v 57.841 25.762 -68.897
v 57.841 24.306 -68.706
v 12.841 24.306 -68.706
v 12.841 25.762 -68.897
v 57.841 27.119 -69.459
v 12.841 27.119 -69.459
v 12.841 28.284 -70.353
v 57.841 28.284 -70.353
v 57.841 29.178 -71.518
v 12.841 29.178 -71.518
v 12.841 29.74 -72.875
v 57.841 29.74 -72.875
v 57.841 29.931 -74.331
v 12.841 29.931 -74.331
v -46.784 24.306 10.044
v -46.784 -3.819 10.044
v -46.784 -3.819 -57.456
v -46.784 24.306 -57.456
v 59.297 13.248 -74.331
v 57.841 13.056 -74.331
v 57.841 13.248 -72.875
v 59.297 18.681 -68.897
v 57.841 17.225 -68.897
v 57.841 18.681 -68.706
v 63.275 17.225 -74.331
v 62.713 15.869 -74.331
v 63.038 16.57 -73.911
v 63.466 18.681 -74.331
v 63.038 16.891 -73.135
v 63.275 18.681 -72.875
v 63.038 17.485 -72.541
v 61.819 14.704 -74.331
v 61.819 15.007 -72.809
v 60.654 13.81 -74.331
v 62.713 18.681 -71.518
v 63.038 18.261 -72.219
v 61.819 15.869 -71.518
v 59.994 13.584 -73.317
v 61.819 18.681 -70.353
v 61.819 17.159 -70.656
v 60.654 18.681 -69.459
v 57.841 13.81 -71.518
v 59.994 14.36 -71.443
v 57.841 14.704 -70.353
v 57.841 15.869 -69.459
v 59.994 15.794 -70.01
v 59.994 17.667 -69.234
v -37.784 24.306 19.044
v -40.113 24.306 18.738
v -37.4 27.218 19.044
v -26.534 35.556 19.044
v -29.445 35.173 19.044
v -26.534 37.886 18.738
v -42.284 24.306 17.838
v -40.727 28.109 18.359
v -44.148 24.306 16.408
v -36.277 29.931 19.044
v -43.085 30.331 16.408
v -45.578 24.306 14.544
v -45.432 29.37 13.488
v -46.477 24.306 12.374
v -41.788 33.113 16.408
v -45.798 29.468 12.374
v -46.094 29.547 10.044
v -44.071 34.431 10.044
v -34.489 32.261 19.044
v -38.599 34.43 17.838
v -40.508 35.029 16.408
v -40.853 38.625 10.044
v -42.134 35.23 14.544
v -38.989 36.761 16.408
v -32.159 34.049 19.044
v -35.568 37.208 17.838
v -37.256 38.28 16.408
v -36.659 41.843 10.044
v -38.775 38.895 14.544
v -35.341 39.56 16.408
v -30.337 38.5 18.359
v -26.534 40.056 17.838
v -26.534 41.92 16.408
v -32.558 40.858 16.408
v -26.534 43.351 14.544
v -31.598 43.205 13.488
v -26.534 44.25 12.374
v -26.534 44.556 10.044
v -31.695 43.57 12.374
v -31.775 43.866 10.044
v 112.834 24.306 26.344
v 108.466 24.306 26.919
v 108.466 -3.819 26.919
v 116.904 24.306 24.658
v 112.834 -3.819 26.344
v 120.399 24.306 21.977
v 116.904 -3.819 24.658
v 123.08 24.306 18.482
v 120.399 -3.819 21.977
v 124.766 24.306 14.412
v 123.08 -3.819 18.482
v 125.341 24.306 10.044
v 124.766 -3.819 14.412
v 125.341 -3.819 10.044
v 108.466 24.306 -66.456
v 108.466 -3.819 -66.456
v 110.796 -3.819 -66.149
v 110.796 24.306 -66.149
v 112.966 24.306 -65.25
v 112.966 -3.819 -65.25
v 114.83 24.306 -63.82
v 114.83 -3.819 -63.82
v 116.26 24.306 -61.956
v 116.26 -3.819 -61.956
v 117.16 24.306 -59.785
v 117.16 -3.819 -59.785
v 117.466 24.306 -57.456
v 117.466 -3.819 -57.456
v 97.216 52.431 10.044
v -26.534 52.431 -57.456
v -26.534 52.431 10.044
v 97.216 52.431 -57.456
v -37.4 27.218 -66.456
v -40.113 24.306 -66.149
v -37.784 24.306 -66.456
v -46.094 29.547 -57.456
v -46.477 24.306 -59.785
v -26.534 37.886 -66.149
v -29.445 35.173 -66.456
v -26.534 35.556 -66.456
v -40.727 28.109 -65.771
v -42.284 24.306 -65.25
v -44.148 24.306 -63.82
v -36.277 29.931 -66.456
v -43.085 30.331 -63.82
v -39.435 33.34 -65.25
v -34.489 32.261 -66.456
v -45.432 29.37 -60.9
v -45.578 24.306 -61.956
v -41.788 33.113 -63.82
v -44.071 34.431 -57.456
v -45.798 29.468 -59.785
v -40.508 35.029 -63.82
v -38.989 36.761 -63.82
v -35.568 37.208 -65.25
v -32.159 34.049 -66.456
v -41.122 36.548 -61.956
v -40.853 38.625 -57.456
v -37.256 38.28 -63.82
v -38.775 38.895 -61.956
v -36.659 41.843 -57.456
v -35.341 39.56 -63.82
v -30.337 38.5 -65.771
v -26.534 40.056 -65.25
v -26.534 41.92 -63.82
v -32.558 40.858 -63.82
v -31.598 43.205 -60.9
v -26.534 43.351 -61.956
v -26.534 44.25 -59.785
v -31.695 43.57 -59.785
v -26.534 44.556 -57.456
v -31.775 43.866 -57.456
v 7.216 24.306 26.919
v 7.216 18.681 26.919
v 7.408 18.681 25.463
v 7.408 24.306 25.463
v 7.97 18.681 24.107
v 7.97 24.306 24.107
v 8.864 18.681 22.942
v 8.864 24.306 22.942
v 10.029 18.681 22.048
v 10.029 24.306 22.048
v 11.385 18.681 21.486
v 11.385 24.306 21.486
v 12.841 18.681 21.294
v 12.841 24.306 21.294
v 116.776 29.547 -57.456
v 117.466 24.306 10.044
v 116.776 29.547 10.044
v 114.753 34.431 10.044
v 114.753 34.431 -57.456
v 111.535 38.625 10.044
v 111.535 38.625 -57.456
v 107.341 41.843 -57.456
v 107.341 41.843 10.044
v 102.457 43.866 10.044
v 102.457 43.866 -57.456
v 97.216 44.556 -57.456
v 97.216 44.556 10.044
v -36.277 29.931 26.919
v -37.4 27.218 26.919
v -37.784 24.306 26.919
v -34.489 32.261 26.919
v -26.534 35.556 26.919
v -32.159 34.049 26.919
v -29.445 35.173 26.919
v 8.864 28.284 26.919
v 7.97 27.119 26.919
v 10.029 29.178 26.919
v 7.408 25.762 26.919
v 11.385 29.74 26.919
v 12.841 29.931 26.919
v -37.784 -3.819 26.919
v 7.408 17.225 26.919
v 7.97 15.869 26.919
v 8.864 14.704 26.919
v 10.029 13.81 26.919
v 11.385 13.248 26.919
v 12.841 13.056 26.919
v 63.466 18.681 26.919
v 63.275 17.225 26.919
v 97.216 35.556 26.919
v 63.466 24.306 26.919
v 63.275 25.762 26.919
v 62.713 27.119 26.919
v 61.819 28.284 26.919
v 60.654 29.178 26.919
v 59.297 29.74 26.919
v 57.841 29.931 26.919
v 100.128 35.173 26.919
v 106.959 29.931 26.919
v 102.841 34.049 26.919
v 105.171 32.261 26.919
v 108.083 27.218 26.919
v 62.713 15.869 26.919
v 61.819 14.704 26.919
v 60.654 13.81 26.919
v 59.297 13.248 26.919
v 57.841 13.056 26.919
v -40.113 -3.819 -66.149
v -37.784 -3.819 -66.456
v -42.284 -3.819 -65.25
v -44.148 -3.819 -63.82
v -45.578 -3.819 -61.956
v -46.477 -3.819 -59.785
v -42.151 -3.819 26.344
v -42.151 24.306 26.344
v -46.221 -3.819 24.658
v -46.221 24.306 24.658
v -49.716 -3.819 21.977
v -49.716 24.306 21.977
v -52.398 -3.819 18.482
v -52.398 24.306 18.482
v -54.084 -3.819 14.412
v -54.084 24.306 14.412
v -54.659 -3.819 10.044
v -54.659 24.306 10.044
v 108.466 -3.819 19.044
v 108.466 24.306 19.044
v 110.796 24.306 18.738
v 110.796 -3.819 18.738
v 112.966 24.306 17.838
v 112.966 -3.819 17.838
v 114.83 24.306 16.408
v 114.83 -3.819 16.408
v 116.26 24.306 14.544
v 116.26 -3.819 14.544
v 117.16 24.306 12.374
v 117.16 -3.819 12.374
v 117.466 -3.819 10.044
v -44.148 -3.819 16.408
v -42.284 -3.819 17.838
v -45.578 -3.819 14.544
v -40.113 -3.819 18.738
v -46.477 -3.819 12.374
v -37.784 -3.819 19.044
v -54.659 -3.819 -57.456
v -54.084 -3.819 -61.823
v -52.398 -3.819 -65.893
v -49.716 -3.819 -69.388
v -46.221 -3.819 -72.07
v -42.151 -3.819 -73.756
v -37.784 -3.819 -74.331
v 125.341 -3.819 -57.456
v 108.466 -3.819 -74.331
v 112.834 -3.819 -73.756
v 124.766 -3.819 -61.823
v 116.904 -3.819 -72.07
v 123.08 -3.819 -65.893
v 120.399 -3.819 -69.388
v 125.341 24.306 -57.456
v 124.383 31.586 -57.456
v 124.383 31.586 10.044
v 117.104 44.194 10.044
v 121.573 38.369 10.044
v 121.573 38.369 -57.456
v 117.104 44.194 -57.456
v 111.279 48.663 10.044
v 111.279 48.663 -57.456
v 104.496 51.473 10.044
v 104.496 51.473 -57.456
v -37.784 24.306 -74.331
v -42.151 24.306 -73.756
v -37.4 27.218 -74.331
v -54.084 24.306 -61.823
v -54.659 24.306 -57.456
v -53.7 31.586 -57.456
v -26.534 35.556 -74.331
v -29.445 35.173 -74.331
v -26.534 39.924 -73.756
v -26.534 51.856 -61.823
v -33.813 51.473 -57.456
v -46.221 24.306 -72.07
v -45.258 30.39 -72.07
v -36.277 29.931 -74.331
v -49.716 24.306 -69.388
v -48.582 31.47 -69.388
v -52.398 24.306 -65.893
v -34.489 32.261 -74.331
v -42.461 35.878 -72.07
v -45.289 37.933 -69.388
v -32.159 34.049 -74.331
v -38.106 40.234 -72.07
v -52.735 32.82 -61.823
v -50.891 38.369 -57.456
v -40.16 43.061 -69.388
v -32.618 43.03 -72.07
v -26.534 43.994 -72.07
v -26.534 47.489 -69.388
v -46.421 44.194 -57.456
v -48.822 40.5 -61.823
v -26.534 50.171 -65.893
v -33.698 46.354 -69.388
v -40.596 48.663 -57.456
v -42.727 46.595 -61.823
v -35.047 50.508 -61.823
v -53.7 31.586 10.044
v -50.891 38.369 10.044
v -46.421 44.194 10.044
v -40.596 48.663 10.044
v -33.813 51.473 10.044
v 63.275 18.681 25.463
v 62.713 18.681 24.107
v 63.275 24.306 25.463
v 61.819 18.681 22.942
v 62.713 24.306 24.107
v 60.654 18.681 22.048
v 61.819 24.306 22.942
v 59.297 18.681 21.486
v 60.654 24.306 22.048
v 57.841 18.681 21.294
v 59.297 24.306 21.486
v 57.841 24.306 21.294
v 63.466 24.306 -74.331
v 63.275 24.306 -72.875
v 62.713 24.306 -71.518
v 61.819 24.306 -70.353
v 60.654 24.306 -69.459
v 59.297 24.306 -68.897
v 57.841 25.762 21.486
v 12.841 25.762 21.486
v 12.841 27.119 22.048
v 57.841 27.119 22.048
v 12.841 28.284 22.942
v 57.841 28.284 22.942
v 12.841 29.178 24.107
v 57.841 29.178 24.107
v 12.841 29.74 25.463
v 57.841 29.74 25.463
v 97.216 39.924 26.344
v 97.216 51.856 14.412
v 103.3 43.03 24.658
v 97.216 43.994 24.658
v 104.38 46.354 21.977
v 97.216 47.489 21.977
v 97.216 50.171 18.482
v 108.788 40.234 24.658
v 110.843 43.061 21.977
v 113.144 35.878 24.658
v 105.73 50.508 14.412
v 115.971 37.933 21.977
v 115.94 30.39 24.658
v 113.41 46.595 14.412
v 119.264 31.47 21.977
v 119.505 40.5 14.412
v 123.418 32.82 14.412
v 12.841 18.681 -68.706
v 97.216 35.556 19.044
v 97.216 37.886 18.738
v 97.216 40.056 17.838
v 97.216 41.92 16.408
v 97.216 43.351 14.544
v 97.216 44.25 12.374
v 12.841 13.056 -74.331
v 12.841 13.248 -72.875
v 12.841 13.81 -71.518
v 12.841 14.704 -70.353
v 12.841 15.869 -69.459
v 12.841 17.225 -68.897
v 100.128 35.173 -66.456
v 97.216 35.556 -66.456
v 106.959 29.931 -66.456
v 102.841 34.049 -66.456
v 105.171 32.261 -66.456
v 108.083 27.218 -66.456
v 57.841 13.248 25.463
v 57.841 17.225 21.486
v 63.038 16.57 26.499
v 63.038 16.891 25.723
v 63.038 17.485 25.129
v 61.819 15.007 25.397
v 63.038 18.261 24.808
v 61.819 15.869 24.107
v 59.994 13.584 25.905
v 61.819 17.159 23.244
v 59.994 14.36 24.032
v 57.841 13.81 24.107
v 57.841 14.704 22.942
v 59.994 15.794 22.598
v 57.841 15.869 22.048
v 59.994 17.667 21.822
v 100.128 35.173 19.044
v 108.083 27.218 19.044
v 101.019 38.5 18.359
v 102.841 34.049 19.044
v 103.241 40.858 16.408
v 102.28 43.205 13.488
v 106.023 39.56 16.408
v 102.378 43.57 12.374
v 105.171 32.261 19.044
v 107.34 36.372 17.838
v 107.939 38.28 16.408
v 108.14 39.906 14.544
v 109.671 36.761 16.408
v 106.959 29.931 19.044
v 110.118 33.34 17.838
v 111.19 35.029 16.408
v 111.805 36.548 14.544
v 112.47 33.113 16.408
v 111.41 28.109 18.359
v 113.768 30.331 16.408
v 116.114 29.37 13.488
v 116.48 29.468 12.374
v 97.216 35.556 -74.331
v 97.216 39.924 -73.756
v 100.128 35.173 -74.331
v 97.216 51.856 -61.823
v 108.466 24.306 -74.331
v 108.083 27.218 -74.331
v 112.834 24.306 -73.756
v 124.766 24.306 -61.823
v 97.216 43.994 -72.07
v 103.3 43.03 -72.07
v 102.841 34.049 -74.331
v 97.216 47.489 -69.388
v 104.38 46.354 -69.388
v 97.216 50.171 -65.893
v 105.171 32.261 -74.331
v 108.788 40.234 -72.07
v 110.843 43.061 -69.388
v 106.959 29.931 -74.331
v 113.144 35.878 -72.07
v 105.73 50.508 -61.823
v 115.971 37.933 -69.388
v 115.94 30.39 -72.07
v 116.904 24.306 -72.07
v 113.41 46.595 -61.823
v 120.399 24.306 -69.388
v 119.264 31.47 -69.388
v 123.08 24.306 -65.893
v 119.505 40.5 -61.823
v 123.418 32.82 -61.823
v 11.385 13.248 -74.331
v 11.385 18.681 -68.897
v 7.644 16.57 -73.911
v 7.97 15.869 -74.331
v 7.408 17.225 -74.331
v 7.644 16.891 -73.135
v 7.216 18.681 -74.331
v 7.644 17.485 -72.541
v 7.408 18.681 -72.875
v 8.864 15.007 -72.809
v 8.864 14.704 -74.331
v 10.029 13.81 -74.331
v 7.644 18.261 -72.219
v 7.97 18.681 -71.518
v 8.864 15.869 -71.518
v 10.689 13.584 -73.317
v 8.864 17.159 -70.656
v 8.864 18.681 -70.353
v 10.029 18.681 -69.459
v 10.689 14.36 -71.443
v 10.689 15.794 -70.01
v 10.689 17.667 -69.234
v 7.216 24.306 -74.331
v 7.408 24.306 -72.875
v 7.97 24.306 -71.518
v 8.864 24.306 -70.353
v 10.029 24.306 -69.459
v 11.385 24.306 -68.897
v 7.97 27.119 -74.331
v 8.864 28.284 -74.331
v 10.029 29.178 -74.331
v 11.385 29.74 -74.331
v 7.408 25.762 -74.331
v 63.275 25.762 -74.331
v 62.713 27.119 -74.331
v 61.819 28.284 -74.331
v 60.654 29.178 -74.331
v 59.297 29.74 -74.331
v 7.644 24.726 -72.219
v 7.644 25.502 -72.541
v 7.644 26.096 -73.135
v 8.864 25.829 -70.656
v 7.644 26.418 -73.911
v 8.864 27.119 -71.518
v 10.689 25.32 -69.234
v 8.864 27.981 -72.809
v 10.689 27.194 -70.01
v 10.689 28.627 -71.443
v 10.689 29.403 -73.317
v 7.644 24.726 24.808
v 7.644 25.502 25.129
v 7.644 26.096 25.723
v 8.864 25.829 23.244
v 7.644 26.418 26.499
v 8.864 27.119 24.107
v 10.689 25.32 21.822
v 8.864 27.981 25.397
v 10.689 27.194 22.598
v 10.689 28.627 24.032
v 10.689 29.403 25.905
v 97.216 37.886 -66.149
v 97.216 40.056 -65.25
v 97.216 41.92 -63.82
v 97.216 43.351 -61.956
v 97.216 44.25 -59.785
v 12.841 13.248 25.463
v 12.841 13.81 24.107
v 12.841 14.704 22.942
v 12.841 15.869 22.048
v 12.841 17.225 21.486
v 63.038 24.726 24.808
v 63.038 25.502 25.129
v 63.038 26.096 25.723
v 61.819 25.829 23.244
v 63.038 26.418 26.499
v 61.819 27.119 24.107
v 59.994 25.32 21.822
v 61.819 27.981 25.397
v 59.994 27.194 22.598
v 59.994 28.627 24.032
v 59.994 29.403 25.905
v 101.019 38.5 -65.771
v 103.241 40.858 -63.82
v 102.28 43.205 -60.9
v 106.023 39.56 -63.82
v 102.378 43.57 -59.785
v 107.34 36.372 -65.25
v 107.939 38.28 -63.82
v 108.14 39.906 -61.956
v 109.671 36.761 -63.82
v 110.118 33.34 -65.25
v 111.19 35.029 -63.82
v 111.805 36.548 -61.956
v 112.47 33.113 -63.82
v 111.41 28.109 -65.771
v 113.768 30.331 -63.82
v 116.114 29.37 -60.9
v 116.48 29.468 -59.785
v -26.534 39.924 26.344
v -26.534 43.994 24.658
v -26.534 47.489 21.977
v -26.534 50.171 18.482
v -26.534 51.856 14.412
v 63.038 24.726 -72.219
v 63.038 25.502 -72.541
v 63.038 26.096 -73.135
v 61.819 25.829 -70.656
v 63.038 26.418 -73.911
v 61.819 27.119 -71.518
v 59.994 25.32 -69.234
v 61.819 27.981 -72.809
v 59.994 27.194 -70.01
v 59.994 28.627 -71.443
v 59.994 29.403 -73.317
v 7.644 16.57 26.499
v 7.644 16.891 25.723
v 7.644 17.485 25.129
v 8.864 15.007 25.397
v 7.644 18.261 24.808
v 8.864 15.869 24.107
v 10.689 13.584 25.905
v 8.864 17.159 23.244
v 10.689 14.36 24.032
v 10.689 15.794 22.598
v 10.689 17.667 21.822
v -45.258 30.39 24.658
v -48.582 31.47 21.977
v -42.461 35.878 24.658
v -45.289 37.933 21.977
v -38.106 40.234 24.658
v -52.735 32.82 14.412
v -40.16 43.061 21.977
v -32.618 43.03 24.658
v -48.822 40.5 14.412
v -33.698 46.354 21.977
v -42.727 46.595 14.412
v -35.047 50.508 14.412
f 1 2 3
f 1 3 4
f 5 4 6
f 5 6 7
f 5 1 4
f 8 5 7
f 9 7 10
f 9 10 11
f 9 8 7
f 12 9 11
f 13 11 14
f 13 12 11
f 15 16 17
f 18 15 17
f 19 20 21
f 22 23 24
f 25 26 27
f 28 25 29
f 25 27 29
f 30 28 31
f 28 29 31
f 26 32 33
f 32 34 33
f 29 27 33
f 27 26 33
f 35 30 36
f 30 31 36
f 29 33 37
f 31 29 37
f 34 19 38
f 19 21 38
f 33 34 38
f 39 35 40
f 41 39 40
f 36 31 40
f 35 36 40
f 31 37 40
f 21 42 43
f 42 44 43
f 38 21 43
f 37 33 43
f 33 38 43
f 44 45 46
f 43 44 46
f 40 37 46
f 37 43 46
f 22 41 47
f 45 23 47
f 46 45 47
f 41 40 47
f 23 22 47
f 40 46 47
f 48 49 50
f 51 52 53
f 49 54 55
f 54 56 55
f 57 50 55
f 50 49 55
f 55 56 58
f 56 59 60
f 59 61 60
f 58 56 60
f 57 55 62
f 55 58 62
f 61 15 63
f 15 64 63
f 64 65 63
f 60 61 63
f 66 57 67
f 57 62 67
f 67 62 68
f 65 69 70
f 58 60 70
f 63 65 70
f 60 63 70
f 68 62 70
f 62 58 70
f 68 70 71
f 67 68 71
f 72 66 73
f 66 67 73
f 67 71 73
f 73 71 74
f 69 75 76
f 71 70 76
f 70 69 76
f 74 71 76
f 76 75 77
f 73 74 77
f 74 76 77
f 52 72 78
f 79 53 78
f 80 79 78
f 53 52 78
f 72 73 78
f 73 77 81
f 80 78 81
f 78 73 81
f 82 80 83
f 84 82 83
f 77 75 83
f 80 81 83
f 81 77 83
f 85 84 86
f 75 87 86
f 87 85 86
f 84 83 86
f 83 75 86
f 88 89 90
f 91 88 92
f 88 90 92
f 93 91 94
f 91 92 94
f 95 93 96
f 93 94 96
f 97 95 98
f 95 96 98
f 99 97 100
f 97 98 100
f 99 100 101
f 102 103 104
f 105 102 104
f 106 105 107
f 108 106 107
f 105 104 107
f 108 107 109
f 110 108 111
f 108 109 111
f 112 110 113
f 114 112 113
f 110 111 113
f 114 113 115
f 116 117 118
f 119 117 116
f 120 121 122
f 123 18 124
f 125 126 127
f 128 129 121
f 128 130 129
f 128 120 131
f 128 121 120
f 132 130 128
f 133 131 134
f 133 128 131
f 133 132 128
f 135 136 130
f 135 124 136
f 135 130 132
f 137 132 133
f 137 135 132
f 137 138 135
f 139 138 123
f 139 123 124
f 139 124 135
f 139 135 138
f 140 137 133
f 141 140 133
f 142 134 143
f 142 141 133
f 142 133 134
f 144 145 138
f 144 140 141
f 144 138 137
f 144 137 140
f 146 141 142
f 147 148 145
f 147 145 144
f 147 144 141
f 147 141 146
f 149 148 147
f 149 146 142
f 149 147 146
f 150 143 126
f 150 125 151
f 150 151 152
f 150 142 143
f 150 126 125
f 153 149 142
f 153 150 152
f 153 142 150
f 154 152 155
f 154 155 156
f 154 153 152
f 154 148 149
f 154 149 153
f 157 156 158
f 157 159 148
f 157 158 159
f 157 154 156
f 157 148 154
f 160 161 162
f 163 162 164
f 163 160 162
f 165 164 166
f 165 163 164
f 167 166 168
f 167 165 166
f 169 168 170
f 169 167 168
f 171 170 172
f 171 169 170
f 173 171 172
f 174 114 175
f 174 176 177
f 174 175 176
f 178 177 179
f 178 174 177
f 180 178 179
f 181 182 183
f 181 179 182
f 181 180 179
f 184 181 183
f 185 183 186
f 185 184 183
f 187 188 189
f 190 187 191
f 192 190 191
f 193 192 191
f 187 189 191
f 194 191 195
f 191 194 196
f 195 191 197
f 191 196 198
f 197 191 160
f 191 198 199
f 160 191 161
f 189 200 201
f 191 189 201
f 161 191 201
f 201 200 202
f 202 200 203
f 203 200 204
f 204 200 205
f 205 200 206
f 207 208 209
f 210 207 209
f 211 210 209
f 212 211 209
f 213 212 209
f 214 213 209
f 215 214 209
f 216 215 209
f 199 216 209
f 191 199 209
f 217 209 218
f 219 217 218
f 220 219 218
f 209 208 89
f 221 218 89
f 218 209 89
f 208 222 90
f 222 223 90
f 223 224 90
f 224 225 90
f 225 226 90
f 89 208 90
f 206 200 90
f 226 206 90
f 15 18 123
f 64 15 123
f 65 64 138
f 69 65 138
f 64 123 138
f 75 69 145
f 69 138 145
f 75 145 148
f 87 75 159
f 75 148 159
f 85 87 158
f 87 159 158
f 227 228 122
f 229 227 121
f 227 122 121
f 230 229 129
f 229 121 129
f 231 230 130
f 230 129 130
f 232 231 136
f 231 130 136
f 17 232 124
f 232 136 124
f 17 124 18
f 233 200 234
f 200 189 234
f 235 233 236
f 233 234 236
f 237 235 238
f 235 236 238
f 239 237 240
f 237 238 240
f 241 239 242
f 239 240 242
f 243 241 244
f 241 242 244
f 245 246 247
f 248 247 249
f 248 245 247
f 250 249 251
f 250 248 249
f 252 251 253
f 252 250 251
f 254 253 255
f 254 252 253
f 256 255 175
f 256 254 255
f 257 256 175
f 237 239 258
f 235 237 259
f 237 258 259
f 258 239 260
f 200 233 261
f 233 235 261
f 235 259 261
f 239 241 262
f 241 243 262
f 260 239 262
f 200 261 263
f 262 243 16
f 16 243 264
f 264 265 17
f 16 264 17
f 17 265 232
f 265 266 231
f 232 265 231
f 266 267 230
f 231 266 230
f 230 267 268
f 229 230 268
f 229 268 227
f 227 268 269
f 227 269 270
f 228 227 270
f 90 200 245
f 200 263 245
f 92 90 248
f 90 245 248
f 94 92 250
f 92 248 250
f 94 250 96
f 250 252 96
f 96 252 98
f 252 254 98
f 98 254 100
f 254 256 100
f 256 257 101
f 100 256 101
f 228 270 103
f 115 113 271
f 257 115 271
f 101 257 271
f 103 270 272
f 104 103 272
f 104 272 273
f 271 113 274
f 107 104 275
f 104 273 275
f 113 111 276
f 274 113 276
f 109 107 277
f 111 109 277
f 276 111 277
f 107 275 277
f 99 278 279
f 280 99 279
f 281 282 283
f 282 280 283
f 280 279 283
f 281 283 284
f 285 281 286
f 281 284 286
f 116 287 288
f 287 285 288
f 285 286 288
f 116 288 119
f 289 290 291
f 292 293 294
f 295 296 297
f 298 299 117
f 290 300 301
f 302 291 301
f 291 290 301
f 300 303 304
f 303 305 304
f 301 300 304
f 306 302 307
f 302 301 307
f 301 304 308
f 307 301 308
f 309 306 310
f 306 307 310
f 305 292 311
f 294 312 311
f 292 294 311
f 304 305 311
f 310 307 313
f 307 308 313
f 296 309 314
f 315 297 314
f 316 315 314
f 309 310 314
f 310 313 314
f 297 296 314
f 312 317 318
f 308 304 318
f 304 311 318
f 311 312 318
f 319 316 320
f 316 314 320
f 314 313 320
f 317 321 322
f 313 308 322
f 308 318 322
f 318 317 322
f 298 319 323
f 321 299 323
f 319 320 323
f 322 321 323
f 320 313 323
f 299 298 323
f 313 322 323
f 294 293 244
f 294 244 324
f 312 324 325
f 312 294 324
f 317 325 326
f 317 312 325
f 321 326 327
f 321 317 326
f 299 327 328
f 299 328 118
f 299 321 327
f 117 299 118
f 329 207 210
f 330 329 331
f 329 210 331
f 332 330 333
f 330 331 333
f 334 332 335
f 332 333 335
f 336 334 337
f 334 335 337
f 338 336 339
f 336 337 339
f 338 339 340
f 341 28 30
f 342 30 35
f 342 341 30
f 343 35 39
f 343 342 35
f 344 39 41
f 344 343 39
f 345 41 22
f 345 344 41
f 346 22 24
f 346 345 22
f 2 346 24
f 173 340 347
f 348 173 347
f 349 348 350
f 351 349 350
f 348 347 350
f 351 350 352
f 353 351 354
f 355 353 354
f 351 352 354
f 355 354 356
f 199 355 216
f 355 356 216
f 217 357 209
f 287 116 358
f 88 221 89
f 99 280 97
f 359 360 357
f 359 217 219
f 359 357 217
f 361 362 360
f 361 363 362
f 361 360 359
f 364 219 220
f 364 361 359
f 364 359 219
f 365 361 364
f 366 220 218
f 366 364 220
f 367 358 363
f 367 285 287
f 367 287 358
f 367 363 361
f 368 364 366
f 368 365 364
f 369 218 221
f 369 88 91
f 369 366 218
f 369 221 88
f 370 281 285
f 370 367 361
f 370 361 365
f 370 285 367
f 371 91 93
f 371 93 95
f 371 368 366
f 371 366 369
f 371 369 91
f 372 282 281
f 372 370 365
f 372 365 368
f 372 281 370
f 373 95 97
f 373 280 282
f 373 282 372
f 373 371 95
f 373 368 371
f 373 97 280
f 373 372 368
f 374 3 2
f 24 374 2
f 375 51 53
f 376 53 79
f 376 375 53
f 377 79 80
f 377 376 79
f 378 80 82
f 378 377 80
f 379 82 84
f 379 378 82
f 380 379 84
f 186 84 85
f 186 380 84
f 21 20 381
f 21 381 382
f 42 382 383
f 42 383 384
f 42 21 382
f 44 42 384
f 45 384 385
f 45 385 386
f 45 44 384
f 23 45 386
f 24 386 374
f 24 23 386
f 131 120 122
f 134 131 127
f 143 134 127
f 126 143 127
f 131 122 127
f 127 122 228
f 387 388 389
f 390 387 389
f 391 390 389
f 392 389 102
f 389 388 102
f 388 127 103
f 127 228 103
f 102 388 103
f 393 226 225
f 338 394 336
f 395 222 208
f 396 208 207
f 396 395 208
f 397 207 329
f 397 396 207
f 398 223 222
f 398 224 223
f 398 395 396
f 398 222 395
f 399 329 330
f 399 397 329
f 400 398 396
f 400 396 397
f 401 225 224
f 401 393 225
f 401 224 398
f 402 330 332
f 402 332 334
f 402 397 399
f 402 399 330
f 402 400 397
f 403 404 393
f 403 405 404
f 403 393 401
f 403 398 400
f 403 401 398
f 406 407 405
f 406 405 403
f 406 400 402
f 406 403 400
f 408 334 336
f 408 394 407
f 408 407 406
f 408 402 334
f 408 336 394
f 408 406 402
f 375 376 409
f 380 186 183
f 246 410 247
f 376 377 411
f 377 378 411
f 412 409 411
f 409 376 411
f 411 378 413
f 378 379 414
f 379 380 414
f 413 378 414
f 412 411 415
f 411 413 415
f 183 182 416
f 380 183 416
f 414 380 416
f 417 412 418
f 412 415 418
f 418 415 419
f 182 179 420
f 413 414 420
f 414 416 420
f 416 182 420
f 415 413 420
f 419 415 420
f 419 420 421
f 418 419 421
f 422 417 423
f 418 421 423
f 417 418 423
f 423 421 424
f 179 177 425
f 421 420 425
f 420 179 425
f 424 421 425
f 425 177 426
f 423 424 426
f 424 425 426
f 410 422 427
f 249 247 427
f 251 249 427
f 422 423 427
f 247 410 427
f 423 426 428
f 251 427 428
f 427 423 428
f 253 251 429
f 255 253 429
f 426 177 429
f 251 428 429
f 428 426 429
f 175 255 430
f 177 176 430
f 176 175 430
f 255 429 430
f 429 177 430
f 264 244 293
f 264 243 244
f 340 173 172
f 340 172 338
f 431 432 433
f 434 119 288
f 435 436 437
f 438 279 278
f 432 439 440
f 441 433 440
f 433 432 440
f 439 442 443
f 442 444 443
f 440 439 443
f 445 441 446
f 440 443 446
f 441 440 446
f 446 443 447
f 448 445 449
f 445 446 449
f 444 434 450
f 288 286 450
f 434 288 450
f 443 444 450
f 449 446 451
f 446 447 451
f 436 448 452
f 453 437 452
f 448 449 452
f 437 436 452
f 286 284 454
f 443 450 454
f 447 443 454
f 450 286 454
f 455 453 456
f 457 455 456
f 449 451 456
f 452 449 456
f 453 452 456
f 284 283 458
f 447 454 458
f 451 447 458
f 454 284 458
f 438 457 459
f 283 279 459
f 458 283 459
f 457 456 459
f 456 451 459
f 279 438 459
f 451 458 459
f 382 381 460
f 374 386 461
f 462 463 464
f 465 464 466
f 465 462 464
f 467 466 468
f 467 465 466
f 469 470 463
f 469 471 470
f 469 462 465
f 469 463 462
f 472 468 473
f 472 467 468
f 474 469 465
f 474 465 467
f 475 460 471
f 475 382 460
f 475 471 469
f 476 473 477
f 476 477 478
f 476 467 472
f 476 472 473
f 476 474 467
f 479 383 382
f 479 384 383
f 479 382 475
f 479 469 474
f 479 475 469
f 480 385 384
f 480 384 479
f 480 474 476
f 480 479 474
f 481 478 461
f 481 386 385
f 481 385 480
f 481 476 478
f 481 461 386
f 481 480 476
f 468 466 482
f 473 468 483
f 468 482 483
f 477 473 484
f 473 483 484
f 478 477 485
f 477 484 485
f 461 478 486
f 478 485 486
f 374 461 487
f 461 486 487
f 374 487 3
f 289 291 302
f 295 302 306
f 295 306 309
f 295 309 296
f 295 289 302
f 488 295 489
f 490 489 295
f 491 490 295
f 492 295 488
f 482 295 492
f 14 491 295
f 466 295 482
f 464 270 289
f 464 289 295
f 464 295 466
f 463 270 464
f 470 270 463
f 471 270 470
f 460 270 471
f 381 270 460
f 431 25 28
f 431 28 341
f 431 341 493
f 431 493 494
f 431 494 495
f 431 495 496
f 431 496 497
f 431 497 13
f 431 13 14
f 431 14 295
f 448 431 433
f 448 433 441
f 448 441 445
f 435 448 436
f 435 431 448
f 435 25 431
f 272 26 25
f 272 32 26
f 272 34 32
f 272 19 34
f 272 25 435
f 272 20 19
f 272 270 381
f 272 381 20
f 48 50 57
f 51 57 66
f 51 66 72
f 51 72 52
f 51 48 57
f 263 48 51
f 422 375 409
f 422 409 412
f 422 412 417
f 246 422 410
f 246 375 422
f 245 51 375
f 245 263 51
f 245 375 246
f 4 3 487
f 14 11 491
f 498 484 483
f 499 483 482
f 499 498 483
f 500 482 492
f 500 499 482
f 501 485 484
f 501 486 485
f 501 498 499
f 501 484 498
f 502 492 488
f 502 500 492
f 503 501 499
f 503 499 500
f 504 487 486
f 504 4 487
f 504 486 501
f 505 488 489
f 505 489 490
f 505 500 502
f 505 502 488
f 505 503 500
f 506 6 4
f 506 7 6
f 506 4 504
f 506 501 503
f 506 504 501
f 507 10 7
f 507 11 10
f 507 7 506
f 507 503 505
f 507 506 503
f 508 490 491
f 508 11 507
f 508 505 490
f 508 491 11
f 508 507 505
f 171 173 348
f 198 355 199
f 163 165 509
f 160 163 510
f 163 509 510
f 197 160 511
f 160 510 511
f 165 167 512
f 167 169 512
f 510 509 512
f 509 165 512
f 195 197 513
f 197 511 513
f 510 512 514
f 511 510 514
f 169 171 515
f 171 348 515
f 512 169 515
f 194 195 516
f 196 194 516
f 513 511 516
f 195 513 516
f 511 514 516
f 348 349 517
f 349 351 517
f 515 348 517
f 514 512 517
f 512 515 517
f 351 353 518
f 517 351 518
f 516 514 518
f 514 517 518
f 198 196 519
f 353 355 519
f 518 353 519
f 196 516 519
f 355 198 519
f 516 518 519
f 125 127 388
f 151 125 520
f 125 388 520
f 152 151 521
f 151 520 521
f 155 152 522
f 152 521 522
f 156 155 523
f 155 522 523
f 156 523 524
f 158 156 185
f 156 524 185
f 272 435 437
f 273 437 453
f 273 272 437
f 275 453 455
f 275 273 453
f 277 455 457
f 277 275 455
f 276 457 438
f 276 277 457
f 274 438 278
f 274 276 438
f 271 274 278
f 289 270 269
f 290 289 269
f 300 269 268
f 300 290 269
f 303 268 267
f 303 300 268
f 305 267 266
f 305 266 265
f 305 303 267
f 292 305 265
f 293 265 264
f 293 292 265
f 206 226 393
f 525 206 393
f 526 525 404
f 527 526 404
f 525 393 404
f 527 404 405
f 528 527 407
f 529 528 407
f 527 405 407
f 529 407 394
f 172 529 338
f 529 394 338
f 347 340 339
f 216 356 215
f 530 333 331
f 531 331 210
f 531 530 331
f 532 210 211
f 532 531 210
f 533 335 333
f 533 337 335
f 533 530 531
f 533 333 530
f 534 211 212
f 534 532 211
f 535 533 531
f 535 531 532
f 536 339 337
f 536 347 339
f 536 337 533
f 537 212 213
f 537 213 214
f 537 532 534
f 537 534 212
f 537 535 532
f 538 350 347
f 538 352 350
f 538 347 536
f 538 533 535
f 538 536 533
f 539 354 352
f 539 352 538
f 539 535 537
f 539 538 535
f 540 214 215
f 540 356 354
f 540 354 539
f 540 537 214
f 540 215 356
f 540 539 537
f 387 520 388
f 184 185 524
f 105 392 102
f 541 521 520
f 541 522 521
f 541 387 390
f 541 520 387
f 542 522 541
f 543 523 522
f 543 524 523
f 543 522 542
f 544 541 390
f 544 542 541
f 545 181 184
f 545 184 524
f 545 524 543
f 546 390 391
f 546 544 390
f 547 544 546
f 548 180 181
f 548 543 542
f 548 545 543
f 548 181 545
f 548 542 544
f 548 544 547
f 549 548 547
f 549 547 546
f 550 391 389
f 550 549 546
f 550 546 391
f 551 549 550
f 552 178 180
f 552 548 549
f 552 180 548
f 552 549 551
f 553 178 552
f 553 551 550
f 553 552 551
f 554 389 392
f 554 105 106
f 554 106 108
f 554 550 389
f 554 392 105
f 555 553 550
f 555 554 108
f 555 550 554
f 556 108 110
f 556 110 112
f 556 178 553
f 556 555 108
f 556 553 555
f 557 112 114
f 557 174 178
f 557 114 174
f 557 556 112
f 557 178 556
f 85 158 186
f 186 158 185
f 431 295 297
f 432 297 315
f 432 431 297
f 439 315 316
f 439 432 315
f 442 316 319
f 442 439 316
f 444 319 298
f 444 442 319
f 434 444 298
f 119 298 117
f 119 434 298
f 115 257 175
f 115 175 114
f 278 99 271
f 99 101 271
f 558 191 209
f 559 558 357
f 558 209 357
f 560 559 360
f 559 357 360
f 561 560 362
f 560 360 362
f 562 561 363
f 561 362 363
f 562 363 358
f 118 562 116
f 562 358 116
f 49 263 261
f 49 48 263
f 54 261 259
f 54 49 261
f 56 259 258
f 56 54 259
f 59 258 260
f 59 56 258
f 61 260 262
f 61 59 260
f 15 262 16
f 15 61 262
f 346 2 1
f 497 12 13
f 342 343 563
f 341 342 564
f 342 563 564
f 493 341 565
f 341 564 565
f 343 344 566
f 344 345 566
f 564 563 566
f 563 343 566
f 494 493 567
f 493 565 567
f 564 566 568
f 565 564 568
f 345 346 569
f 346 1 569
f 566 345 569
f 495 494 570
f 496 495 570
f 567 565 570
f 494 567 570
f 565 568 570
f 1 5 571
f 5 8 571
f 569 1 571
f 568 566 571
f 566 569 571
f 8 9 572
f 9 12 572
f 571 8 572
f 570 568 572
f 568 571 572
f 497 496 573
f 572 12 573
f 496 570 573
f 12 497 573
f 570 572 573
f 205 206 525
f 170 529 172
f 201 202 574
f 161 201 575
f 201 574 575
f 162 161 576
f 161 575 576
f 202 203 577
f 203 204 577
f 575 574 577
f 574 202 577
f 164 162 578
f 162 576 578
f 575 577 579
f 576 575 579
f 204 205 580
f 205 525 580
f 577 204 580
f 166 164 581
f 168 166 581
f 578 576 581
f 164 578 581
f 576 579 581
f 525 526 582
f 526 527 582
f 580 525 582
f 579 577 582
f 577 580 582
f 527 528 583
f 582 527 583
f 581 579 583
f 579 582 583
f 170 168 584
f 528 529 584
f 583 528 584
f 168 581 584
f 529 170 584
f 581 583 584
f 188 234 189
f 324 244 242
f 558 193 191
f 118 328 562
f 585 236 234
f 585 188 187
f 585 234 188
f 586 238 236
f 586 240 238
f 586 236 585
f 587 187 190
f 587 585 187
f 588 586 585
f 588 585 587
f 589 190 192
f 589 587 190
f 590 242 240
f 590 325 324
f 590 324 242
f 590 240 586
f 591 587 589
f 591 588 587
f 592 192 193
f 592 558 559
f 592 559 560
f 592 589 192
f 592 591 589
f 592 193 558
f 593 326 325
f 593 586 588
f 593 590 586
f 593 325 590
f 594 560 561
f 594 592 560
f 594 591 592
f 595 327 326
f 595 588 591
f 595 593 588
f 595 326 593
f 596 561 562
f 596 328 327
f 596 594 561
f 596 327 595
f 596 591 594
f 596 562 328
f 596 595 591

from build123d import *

# Parameters (mm, degrees)
ESQUISSE1_W             = 160
ESQUISSE1_H             = 90
EXTRUSION1_DEPTH        = 50
CONG_1_R                = 25
CONG_2_R                = 15
COQUE1_T                = -7
ESQUISSE2_W             = 50
ESQUISSE2_H             = 15
ENL_V_MAT_EXTRU_1_DEPTH = 5
CONG_4_R                = 5
CONG_5_R                = 5
CONG_6_R                = 5
CONG_7_R                = 5
CONG_4_OF_SYM_TRIE1_R   = 5
CONG_5_OF_SYM_TRIE1_R   = 5
CONG_6_OF_SYM_TRIE1_R   = 5
CONG_7_OF_SYM_TRIE1_R   = 5
ECHELLE1_SCALE          = 1.125


with BuildPart() as part:
    # Esquisse1 → Extrusion1 (new body)
    with BuildSketch(Plane(origin=(0, 0, 0), x_dir=(1, 0, 0), z_dir=(0, 1, 0))):
        with Locations((35.341232877, 23.705753425)):
            Rectangle(ESQUISSE1_W, ESQUISSE1_H)
    extrude(amount=EXTRUSION1_DEPTH)

    # Congé1
    cong_1_edges = [part.edges().sort_by_distance(p)[0] for p in [
        (115.341232877, 50, -23.705753425),
        (-44.658767123, 50, -23.705753425),
    ]]
    fillet(cong_1_edges, radius=CONG_1_R)

    # Congé2
    cong_2_edges = [part.edges().sort_by_distance(p)[0] for p in [
        (35.341232877, 50, 21.294246575),
        (35.341232877, 50, -68.705753425),
        (115.341232877, 12.5, 21.294246575),
        (-44.658767123, 12.5, 21.294246575),
        (108.018902406, 42.67766953, 21.294246575),
        (-37.336436653, 42.67766953, 21.294246575),
        (-44.658767123, 12.5, -68.705753425),
        (115.341232877, 12.5, -68.705753425),
        (108.018902406, 42.67766953, -68.705753425),
        (-37.336436653, 42.67766953, -68.705753425),
    ]]
    fillet(cong_2_edges, radius=CONG_2_R)

    # Coque1
    coque1_openings = [part.faces().sort_by_distance(p)[0] for p in [
        (35.341232877, 0, -23.705753425),
    ]]
    offset(amount=COQUE1_T, openings=coque1_openings, kind=Kind.INTERSECTION)

    # Esquisse2 → Enlèv. mat.-Extru.1 (cut)
    with BuildSketch(Plane.XY.offset(21.294246575)):
        with Locations((35.341232877, 22.5)):
            Rectangle(ESQUISSE2_W, ESQUISSE2_H)
    enl_v_mat_extru_1 = extrude(amount=-ENL_V_MAT_EXTRU_1_DEPTH, mode=Mode.SUBTRACT)

    # Congé4
    cong_4_edges = [part.edges().sort_by_distance(p)[0] for p in [
        (35.341232877, 15, 16.294246575),
    ]]
    fillet(cong_4_edges, radius=CONG_4_R - 0.0001)  # a hair under: the kernel refuses the full size

    # Congé5
    cong_5_edges = [part.edges().sort_by_distance(p)[0] for p in [
        (35.341232877, 30, 16.294246575),
    ]]
    fillet(cong_5_edges, radius=CONG_5_R - 0.0001)  # a hair under: the kernel refuses the full size

    # Congé6
    cong_6_edges = [part.edges().sort_by_distance(p)[0] for p in [
        (10.341232877, 16.464436805, 17.75868338),
        (10.341232877, 22.5, 16.294246575),
        (10.341232877, 28.535563195, 17.75868338),
    ]]
    fillet(cong_6_edges, radius=CONG_6_R - 0.0001)  # a hair under: the kernel refuses the full size

    # Congé7
    cong_7_edges = [part.edges().sort_by_distance(p)[0] for p in [
        (60.341232877, 22.5, 16.294246575),
        (60.341232877, 16.464436805, 17.75868338),
        (60.341232877, 28.535563195, 17.75868338),
    ]]
    fillet(cong_7_edges, radius=CONG_7_R - 0.0001)  # a hair under: the kernel refuses the full size

    # Symétrie1: Enlèv. mat.-Extru.1 across plane
    add(enl_v_mat_extru_1.mirror(Plane.XY.offset(-23.705753425)), mode=Mode.SUBTRACT)

    # Congé4 of Symétrie1
    cong_4_of_sym_trie1_edges = [part.edges().sort_by_distance(p)[0] for p in [
        (35.341232877, 15, -63.705753425),
    ]]
    fillet(cong_4_of_sym_trie1_edges, radius=CONG_4_OF_SYM_TRIE1_R - 0.0001)  # a hair under: the kernel refuses the full size

    # Congé5 of Symétrie1
    cong_5_of_sym_trie1_edges = [part.edges().sort_by_distance(p)[0] for p in [
        (35.341232877, 30, -63.705753425),
    ]]
    fillet(cong_5_of_sym_trie1_edges, radius=CONG_5_OF_SYM_TRIE1_R - 0.0001)  # a hair under: the kernel refuses the full size

    # Congé6 of Symétrie1
    cong_6_of_sym_trie1_edges = [part.edges().sort_by_distance(p)[0] for p in [
        (10.341232877, 16.464436805, -65.170190229),
        (10.341232877, 22.5, -63.705753425),
        (10.341232877, 28.535563195, -65.170190229),
    ]]
    fillet(cong_6_of_sym_trie1_edges, radius=CONG_6_OF_SYM_TRIE1_R - 0.0001)  # a hair under: the kernel refuses the full size

    # Congé7 of Symétrie1
    cong_7_of_sym_trie1_edges = [part.edges().sort_by_distance(p)[0] for p in [
        (60.341232877, 22.5, -63.705753425),
        (60.341232877, 16.464436805, -65.170190229),
        (60.341232877, 28.535563195, -65.170190229),
    ]]
    fillet(cong_7_of_sym_trie1_edges, radius=CONG_7_OF_SYM_TRIE1_R - 0.0001)  # a hair under: the kernel refuses the full size


with BuildPart() as part_1:
    # Echelle1: scaled about (35.341232877, 30.549354713, -23.705753425)
    add(part.part.scale(ECHELLE1_SCALE).moved(Location((-4.41765411, -3.818669339, 2.963219178))))


solid = part_1.part
